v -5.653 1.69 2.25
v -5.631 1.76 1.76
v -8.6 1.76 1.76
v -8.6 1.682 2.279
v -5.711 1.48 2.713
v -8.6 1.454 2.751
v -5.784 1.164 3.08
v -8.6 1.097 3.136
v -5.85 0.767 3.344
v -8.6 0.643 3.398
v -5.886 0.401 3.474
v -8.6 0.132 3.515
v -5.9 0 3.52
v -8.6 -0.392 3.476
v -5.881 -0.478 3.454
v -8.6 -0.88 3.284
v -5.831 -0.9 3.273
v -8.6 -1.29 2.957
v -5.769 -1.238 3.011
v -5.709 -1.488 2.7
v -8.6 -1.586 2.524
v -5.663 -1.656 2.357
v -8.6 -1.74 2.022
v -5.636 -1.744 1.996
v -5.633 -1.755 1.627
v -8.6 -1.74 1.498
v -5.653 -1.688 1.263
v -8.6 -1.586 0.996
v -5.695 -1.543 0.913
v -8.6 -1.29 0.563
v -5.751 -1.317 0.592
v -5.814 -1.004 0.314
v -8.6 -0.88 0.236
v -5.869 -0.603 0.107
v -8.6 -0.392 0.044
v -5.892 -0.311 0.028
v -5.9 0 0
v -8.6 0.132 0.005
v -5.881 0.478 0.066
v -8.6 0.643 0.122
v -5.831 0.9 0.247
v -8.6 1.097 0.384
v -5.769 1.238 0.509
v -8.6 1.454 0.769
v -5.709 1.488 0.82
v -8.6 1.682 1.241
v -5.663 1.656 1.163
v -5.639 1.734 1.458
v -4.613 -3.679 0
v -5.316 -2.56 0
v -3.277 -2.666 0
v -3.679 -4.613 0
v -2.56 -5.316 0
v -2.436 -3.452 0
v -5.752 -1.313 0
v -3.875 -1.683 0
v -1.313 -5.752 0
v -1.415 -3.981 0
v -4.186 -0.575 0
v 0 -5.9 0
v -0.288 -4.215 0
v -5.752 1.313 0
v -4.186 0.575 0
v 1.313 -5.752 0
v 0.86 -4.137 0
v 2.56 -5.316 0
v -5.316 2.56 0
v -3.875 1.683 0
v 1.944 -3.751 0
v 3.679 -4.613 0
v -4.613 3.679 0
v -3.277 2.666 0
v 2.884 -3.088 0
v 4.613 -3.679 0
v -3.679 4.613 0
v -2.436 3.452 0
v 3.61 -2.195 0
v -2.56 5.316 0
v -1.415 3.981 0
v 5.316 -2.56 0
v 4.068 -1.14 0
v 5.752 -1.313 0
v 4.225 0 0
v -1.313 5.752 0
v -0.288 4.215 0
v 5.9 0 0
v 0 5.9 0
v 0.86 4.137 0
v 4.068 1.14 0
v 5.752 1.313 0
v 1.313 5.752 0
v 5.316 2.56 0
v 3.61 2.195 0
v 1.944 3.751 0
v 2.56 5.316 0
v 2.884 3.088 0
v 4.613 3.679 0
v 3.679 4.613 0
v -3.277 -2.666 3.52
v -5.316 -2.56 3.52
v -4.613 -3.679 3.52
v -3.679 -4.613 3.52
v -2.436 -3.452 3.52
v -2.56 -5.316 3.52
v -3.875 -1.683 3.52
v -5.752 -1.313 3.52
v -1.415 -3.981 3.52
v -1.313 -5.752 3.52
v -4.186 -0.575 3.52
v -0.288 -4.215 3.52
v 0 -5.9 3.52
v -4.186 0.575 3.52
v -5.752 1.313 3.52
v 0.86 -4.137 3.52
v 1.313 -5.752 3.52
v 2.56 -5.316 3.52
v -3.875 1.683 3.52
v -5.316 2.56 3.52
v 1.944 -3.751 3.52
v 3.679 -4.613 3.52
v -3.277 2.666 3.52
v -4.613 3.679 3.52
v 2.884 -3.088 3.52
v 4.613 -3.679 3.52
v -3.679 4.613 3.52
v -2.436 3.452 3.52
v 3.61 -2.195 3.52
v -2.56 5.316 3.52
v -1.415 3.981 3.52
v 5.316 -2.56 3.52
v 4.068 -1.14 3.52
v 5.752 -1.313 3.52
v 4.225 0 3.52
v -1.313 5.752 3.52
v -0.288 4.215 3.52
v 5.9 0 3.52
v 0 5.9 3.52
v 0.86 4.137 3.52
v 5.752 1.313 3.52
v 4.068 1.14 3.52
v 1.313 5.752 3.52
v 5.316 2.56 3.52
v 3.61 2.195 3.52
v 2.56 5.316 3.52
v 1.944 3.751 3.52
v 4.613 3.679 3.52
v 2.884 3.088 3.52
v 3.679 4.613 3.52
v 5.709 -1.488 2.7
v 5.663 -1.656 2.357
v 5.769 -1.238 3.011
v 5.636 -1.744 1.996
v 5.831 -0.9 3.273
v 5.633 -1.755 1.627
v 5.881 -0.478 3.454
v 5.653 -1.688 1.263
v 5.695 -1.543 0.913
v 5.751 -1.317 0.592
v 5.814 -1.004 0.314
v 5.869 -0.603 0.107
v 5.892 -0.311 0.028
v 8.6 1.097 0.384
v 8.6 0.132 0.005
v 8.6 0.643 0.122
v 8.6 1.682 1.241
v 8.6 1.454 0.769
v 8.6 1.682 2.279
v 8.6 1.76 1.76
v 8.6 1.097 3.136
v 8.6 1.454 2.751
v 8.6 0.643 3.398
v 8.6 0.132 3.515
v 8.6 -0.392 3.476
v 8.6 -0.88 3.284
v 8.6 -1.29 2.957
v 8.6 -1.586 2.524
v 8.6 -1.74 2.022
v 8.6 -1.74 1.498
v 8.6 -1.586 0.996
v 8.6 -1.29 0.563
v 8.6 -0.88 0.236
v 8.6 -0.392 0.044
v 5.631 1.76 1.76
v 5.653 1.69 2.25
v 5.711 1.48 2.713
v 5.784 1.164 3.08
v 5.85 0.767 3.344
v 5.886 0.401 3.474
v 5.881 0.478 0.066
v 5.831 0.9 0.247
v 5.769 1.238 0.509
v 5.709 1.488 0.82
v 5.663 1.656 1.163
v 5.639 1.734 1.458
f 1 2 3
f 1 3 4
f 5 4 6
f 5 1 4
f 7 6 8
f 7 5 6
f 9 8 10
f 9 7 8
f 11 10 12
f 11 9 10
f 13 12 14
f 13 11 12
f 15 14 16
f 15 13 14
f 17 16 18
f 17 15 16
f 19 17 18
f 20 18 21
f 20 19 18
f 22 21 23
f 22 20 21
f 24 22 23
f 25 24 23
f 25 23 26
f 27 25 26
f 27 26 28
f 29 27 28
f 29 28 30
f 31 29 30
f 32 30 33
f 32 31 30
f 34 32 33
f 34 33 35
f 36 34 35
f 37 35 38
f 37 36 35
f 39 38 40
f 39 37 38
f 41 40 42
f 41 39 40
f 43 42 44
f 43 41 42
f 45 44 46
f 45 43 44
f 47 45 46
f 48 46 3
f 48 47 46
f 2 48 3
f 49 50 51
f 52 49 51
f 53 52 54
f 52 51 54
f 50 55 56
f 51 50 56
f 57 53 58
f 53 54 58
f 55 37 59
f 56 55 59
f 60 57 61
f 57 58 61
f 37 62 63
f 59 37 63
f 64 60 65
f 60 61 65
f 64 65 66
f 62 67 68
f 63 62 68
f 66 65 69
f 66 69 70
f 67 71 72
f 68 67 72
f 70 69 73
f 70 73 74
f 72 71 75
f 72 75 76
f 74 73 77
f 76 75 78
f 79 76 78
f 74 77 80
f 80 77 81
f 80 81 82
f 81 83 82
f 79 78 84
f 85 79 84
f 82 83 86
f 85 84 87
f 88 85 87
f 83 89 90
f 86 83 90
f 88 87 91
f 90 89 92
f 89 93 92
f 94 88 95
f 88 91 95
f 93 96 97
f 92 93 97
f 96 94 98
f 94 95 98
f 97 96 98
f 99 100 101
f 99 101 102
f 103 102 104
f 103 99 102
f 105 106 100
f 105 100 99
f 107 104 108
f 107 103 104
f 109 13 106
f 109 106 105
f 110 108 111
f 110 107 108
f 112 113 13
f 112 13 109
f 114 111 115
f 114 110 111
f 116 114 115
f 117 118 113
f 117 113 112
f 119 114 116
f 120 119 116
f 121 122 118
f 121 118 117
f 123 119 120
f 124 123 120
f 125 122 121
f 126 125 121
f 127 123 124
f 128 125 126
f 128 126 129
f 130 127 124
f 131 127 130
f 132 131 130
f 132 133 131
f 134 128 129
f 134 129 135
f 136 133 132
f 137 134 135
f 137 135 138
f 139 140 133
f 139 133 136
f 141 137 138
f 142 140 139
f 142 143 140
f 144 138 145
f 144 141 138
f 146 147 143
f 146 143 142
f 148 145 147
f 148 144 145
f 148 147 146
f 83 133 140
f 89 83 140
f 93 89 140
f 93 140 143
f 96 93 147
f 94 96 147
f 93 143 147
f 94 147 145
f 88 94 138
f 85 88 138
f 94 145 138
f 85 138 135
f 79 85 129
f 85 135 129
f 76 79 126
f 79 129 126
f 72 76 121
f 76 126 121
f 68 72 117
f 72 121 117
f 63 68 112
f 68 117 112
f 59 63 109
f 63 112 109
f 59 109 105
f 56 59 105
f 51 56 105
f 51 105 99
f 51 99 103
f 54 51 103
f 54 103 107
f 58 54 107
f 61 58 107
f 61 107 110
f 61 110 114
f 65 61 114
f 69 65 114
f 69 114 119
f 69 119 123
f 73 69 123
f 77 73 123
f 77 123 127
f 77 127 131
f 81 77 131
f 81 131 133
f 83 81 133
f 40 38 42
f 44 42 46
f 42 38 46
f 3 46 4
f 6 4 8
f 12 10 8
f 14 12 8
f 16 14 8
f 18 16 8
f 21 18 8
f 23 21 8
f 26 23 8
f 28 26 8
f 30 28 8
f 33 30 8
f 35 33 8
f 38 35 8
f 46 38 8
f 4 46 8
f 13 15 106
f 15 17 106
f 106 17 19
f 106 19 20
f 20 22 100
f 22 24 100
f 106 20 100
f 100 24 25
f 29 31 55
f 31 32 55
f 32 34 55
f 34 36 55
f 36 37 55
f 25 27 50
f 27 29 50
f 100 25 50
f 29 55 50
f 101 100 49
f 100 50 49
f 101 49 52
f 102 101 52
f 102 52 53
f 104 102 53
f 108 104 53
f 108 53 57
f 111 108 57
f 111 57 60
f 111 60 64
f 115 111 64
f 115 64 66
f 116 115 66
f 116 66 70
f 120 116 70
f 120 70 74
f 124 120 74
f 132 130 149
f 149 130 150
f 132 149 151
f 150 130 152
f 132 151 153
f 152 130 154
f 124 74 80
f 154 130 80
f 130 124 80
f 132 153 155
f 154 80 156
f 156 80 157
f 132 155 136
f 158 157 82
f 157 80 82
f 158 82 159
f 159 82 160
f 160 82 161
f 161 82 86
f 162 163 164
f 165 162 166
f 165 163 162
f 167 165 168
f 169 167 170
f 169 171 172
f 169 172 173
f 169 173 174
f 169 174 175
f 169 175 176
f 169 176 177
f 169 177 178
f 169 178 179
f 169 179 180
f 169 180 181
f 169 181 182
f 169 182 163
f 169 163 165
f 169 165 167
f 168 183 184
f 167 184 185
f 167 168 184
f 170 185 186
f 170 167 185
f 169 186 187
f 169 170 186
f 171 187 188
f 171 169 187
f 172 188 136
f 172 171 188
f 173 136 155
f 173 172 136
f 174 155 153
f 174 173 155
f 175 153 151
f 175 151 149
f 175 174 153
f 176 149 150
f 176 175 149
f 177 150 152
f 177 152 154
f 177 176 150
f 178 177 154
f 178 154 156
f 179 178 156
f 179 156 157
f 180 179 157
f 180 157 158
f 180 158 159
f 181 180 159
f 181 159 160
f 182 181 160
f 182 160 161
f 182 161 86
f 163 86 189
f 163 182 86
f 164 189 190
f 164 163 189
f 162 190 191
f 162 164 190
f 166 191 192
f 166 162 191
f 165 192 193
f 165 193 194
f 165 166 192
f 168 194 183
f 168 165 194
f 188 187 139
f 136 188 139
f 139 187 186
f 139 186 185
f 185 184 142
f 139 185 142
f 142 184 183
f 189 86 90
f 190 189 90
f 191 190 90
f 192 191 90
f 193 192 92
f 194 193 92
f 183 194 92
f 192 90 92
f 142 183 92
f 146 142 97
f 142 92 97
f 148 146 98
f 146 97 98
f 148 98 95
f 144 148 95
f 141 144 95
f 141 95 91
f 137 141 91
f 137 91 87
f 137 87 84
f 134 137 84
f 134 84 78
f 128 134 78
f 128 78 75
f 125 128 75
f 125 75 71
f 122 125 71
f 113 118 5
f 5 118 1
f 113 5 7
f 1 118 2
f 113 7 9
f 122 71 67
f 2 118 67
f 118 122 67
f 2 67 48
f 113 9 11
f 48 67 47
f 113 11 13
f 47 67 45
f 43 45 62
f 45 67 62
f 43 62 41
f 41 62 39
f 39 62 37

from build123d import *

# Parameters (mm, degrees)
F0_R          = 1.76
F1_DEPTH      = 8.6
F1_DEPTH_BACK = 8.6
F2_R          = 5.9
F3_DEPTH      = 3.52
F4_R          = 4.225
F5_DEPTH      = 5


with BuildPart() as f1:
    # F0 (on Right) → F1 (new body, two sides)
    with BuildSketch(Plane.YZ) as f1_sk:
        with Locations((0, 1.76)):
            Circle(F0_R)
    extrude(amount=F1_DEPTH)
    extrude(f1_sk.sketch, amount=-F1_DEPTH_BACK)

    # F2 (on Top) → F3 (join)
    with BuildSketch(Plane.XY):
        Circle(F2_R)
    extrude(amount=F3_DEPTH)

    # F4 (on face) → F5 (cut)
    with BuildSketch(Plane.XY.offset(3.52)):
        Circle(F4_R)
    extrude(amount=-F5_DEPTH, mode=Mode.SUBTRACT)


solid = f1.part
